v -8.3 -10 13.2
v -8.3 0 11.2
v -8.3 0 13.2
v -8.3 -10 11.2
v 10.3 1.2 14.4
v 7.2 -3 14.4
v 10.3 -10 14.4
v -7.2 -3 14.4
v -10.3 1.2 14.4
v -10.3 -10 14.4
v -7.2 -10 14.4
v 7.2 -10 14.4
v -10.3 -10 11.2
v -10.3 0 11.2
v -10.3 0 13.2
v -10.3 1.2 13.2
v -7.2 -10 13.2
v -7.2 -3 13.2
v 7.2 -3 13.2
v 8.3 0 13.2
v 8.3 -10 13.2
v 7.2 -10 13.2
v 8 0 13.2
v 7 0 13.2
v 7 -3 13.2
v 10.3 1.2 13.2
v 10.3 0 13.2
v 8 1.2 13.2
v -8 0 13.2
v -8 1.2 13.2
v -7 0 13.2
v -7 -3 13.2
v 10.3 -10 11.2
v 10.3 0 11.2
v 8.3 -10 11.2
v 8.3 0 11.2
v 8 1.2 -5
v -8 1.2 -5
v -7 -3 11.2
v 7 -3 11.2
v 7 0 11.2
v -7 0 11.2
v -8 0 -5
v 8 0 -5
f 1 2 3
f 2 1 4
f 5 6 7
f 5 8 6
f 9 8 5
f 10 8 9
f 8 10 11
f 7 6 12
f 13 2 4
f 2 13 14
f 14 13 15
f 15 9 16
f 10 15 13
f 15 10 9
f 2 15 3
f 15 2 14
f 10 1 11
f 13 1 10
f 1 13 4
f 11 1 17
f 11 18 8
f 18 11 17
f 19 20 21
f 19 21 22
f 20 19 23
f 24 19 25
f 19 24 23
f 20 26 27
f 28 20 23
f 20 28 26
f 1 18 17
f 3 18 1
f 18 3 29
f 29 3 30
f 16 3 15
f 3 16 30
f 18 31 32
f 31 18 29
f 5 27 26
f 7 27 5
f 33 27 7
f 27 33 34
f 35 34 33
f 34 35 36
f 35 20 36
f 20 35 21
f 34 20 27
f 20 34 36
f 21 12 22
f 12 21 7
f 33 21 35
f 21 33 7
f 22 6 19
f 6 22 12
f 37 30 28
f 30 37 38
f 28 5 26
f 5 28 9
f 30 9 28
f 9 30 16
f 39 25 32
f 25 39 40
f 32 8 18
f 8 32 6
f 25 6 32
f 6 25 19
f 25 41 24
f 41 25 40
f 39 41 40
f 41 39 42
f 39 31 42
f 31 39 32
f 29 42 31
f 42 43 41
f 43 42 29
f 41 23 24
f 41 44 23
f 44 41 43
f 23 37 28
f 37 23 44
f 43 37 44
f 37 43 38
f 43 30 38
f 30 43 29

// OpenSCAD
// ReachSense six-finger wrap v2. Units: mm. Experimental, physically unverified.
// R: +X lateral, +Y distal (towards fingertip), +Z dorsal.
// A REMOVABLE seating gauge defines Y=0. The wearable deck ends at Y=-3.
// Remove the gauge before testing; no permanent wall blocks the fingertip.
// This defines nominal longitudinal registration, NOT an anatomical 3D point.
$fn = 48;
part = "gauge"; // "holder", "gauge" or "strap"
marker_id = 21;
finger_diameter_mm = 20;
marker_edge_mm = 10;
quiet_zone_mm = 2;
frame_mm = 1;
wall_mm = 2;
stop_wall_mm = 1.2;
strap_width_mm = 6;
strap_length_mm = 90;
gauge_side_clearance_mm = 0.3;
r = finger_diameter_mm/2;
tile = marker_edge_mm + 2*quiet_zone_mm;
deck_width = tile + 2*frame_mm;
length = tile + 2*frame_mm + 8;
deck_front_y = -3;
deck_back_y = deck_front_y-length;
deck_bottom = r + wall_mm - 0.8;
deck_top = deck_bottom + 2;
pocket_depth = 0.2;
marker_y = deck_front_y-(frame_mm+quiet_zone_mm+marker_edge_mm/2);
support_y = [deck_front_y-5,deck_back_y+5];
nail_seat_width = min(8,finger_diameter_mm/2);
nail_seat_z = r-0.6;
assert(finger_diameter_mm >= 12 && finger_diameter_mm <= 26,"Choose a 12–26 mm candidate opening");
assert(marker_edge_mm >= 8 && marker_edge_mm <= 16,"Choose an 8–16 mm black edge");
assert(quiet_zone_mm >= 2,"Keep the full white quiet zone");
assert(marker_id >= 0 && marker_id < 100,"DICT_4X4_100 ID required");
module support(y) {
    translate([0,y,0]) intersection() {
        difference() {
            rotate([90,0,0]) cylinder(r=r+wall_mm,h=6.8,center=true);
            rotate([90,0,0]) cylinder(r=r,h=8.8,center=true);
        }
        translate([-r-wall_mm-1,-4.4,0]) cube([2*(r+wall_mm+1),8.8,r+wall_mm+1]);
    }
    // Flat dorsal bearing at each strap region closes the gap below the deck.
    // Contact with a real nail/dorsal surface and rotational retention are unverified.
    translate([-nail_seat_width/2,y-1.5,nail_seat_z])
        cube([nail_seat_width,3,deck_bottom-nail_seat_z+0.2]);
    for(sign=[-1,1]) translate([sign*(r+wall_mm+2.1),y,1.5]) difference() {
        cube([6,8.8,3],center=true);
        cube([2.6,6.4,5],center=true);
    }
}
module deck() {
    // Rounded corners retain a straight central gauge abutment at Y=-3.
    hull() for(x=[-deck_width/2+1,deck_width/2-1])
        for(y=[deck_back_y+1,deck_front_y-1])
            translate([x,y,deck_bottom]) cylinder(r=1,h=2);
}
module holder() {
    difference() {
        union() { for(y=support_y) support(y); deck(); }
        translate([-tile/2-0.1,marker_y-tile/2-0.1,deck_top-pocket_depth])
            cube([tile+0.2,tile+0.2,pocket_depth+1]);
    }
}
module gauge() {
    // Hand-held drop-on gauge, NOT a validated snap fit. Hold its proximal
    // abutment against the deck's front face at Y=-3 while gently seating the finger.
    // Feet sit on the bare side frame; the ArUco pocket remains clear.
    union() {
        translate([-deck_width/2-2.3,deck_front_y,deck_top])
            cube([deck_width+4.6,-deck_front_y+stop_wall_mm,1.2]);
        // Deck contact Y=-3; fingertip contact Y=0. Remove upwards after tightening.
        translate([-deck_width/2+1,deck_front_y,deck_bottom])
            cube([deck_width-2,-deck_front_y,deck_top-deck_bottom+0.5]);
        translate([-deck_width/2,0,-r/2])
            cube([deck_width,stop_wall_mm,deck_top+1.2+r/2]);
        for(sign=[-1,1]) {
            x=sign>0 ? deck_width/2+gauge_side_clearance_mm : -deck_width/2-gauge_side_clearance_mm-2;
            translate([x,-10,deck_bottom]) cube([2,10,deck_top-deck_bottom+1.2]);
            foot_x=sign>0 ? deck_width/2-0.8 : -deck_width/2-2.3;
            translate([foot_x,-10,deck_top]) cube([3.1,10,1.2]);
        }
    }
}
module strap() {
    // TPU-only ladder strip. Ends require a return loop/fastener or hook-and-loop.
    union() {
        translate([-strap_length_mm/2,-strap_width_mm/2,0]) cube([strap_length_mm,strap_width_mm,0.8]);
        for(x=[-strap_length_mm/2+3:4:strap_length_mm/2-3])
            translate([x-0.7,-strap_width_mm/2,0.8]) cube([1.4,strap_width_mm,0.5]);
    }
}
if(part=="strap") strap(); else if(part=="gauge") gauge(); else holder();
echo(reference_plane_y_mm=0,deck_front_y_mm=deck_front_y);
echo(marker_center_R_mm=[0,marker_y,deck_top-pocket_depth+0.15]);
echo(marker_center_to_reference_plane_mm=-marker_y);
